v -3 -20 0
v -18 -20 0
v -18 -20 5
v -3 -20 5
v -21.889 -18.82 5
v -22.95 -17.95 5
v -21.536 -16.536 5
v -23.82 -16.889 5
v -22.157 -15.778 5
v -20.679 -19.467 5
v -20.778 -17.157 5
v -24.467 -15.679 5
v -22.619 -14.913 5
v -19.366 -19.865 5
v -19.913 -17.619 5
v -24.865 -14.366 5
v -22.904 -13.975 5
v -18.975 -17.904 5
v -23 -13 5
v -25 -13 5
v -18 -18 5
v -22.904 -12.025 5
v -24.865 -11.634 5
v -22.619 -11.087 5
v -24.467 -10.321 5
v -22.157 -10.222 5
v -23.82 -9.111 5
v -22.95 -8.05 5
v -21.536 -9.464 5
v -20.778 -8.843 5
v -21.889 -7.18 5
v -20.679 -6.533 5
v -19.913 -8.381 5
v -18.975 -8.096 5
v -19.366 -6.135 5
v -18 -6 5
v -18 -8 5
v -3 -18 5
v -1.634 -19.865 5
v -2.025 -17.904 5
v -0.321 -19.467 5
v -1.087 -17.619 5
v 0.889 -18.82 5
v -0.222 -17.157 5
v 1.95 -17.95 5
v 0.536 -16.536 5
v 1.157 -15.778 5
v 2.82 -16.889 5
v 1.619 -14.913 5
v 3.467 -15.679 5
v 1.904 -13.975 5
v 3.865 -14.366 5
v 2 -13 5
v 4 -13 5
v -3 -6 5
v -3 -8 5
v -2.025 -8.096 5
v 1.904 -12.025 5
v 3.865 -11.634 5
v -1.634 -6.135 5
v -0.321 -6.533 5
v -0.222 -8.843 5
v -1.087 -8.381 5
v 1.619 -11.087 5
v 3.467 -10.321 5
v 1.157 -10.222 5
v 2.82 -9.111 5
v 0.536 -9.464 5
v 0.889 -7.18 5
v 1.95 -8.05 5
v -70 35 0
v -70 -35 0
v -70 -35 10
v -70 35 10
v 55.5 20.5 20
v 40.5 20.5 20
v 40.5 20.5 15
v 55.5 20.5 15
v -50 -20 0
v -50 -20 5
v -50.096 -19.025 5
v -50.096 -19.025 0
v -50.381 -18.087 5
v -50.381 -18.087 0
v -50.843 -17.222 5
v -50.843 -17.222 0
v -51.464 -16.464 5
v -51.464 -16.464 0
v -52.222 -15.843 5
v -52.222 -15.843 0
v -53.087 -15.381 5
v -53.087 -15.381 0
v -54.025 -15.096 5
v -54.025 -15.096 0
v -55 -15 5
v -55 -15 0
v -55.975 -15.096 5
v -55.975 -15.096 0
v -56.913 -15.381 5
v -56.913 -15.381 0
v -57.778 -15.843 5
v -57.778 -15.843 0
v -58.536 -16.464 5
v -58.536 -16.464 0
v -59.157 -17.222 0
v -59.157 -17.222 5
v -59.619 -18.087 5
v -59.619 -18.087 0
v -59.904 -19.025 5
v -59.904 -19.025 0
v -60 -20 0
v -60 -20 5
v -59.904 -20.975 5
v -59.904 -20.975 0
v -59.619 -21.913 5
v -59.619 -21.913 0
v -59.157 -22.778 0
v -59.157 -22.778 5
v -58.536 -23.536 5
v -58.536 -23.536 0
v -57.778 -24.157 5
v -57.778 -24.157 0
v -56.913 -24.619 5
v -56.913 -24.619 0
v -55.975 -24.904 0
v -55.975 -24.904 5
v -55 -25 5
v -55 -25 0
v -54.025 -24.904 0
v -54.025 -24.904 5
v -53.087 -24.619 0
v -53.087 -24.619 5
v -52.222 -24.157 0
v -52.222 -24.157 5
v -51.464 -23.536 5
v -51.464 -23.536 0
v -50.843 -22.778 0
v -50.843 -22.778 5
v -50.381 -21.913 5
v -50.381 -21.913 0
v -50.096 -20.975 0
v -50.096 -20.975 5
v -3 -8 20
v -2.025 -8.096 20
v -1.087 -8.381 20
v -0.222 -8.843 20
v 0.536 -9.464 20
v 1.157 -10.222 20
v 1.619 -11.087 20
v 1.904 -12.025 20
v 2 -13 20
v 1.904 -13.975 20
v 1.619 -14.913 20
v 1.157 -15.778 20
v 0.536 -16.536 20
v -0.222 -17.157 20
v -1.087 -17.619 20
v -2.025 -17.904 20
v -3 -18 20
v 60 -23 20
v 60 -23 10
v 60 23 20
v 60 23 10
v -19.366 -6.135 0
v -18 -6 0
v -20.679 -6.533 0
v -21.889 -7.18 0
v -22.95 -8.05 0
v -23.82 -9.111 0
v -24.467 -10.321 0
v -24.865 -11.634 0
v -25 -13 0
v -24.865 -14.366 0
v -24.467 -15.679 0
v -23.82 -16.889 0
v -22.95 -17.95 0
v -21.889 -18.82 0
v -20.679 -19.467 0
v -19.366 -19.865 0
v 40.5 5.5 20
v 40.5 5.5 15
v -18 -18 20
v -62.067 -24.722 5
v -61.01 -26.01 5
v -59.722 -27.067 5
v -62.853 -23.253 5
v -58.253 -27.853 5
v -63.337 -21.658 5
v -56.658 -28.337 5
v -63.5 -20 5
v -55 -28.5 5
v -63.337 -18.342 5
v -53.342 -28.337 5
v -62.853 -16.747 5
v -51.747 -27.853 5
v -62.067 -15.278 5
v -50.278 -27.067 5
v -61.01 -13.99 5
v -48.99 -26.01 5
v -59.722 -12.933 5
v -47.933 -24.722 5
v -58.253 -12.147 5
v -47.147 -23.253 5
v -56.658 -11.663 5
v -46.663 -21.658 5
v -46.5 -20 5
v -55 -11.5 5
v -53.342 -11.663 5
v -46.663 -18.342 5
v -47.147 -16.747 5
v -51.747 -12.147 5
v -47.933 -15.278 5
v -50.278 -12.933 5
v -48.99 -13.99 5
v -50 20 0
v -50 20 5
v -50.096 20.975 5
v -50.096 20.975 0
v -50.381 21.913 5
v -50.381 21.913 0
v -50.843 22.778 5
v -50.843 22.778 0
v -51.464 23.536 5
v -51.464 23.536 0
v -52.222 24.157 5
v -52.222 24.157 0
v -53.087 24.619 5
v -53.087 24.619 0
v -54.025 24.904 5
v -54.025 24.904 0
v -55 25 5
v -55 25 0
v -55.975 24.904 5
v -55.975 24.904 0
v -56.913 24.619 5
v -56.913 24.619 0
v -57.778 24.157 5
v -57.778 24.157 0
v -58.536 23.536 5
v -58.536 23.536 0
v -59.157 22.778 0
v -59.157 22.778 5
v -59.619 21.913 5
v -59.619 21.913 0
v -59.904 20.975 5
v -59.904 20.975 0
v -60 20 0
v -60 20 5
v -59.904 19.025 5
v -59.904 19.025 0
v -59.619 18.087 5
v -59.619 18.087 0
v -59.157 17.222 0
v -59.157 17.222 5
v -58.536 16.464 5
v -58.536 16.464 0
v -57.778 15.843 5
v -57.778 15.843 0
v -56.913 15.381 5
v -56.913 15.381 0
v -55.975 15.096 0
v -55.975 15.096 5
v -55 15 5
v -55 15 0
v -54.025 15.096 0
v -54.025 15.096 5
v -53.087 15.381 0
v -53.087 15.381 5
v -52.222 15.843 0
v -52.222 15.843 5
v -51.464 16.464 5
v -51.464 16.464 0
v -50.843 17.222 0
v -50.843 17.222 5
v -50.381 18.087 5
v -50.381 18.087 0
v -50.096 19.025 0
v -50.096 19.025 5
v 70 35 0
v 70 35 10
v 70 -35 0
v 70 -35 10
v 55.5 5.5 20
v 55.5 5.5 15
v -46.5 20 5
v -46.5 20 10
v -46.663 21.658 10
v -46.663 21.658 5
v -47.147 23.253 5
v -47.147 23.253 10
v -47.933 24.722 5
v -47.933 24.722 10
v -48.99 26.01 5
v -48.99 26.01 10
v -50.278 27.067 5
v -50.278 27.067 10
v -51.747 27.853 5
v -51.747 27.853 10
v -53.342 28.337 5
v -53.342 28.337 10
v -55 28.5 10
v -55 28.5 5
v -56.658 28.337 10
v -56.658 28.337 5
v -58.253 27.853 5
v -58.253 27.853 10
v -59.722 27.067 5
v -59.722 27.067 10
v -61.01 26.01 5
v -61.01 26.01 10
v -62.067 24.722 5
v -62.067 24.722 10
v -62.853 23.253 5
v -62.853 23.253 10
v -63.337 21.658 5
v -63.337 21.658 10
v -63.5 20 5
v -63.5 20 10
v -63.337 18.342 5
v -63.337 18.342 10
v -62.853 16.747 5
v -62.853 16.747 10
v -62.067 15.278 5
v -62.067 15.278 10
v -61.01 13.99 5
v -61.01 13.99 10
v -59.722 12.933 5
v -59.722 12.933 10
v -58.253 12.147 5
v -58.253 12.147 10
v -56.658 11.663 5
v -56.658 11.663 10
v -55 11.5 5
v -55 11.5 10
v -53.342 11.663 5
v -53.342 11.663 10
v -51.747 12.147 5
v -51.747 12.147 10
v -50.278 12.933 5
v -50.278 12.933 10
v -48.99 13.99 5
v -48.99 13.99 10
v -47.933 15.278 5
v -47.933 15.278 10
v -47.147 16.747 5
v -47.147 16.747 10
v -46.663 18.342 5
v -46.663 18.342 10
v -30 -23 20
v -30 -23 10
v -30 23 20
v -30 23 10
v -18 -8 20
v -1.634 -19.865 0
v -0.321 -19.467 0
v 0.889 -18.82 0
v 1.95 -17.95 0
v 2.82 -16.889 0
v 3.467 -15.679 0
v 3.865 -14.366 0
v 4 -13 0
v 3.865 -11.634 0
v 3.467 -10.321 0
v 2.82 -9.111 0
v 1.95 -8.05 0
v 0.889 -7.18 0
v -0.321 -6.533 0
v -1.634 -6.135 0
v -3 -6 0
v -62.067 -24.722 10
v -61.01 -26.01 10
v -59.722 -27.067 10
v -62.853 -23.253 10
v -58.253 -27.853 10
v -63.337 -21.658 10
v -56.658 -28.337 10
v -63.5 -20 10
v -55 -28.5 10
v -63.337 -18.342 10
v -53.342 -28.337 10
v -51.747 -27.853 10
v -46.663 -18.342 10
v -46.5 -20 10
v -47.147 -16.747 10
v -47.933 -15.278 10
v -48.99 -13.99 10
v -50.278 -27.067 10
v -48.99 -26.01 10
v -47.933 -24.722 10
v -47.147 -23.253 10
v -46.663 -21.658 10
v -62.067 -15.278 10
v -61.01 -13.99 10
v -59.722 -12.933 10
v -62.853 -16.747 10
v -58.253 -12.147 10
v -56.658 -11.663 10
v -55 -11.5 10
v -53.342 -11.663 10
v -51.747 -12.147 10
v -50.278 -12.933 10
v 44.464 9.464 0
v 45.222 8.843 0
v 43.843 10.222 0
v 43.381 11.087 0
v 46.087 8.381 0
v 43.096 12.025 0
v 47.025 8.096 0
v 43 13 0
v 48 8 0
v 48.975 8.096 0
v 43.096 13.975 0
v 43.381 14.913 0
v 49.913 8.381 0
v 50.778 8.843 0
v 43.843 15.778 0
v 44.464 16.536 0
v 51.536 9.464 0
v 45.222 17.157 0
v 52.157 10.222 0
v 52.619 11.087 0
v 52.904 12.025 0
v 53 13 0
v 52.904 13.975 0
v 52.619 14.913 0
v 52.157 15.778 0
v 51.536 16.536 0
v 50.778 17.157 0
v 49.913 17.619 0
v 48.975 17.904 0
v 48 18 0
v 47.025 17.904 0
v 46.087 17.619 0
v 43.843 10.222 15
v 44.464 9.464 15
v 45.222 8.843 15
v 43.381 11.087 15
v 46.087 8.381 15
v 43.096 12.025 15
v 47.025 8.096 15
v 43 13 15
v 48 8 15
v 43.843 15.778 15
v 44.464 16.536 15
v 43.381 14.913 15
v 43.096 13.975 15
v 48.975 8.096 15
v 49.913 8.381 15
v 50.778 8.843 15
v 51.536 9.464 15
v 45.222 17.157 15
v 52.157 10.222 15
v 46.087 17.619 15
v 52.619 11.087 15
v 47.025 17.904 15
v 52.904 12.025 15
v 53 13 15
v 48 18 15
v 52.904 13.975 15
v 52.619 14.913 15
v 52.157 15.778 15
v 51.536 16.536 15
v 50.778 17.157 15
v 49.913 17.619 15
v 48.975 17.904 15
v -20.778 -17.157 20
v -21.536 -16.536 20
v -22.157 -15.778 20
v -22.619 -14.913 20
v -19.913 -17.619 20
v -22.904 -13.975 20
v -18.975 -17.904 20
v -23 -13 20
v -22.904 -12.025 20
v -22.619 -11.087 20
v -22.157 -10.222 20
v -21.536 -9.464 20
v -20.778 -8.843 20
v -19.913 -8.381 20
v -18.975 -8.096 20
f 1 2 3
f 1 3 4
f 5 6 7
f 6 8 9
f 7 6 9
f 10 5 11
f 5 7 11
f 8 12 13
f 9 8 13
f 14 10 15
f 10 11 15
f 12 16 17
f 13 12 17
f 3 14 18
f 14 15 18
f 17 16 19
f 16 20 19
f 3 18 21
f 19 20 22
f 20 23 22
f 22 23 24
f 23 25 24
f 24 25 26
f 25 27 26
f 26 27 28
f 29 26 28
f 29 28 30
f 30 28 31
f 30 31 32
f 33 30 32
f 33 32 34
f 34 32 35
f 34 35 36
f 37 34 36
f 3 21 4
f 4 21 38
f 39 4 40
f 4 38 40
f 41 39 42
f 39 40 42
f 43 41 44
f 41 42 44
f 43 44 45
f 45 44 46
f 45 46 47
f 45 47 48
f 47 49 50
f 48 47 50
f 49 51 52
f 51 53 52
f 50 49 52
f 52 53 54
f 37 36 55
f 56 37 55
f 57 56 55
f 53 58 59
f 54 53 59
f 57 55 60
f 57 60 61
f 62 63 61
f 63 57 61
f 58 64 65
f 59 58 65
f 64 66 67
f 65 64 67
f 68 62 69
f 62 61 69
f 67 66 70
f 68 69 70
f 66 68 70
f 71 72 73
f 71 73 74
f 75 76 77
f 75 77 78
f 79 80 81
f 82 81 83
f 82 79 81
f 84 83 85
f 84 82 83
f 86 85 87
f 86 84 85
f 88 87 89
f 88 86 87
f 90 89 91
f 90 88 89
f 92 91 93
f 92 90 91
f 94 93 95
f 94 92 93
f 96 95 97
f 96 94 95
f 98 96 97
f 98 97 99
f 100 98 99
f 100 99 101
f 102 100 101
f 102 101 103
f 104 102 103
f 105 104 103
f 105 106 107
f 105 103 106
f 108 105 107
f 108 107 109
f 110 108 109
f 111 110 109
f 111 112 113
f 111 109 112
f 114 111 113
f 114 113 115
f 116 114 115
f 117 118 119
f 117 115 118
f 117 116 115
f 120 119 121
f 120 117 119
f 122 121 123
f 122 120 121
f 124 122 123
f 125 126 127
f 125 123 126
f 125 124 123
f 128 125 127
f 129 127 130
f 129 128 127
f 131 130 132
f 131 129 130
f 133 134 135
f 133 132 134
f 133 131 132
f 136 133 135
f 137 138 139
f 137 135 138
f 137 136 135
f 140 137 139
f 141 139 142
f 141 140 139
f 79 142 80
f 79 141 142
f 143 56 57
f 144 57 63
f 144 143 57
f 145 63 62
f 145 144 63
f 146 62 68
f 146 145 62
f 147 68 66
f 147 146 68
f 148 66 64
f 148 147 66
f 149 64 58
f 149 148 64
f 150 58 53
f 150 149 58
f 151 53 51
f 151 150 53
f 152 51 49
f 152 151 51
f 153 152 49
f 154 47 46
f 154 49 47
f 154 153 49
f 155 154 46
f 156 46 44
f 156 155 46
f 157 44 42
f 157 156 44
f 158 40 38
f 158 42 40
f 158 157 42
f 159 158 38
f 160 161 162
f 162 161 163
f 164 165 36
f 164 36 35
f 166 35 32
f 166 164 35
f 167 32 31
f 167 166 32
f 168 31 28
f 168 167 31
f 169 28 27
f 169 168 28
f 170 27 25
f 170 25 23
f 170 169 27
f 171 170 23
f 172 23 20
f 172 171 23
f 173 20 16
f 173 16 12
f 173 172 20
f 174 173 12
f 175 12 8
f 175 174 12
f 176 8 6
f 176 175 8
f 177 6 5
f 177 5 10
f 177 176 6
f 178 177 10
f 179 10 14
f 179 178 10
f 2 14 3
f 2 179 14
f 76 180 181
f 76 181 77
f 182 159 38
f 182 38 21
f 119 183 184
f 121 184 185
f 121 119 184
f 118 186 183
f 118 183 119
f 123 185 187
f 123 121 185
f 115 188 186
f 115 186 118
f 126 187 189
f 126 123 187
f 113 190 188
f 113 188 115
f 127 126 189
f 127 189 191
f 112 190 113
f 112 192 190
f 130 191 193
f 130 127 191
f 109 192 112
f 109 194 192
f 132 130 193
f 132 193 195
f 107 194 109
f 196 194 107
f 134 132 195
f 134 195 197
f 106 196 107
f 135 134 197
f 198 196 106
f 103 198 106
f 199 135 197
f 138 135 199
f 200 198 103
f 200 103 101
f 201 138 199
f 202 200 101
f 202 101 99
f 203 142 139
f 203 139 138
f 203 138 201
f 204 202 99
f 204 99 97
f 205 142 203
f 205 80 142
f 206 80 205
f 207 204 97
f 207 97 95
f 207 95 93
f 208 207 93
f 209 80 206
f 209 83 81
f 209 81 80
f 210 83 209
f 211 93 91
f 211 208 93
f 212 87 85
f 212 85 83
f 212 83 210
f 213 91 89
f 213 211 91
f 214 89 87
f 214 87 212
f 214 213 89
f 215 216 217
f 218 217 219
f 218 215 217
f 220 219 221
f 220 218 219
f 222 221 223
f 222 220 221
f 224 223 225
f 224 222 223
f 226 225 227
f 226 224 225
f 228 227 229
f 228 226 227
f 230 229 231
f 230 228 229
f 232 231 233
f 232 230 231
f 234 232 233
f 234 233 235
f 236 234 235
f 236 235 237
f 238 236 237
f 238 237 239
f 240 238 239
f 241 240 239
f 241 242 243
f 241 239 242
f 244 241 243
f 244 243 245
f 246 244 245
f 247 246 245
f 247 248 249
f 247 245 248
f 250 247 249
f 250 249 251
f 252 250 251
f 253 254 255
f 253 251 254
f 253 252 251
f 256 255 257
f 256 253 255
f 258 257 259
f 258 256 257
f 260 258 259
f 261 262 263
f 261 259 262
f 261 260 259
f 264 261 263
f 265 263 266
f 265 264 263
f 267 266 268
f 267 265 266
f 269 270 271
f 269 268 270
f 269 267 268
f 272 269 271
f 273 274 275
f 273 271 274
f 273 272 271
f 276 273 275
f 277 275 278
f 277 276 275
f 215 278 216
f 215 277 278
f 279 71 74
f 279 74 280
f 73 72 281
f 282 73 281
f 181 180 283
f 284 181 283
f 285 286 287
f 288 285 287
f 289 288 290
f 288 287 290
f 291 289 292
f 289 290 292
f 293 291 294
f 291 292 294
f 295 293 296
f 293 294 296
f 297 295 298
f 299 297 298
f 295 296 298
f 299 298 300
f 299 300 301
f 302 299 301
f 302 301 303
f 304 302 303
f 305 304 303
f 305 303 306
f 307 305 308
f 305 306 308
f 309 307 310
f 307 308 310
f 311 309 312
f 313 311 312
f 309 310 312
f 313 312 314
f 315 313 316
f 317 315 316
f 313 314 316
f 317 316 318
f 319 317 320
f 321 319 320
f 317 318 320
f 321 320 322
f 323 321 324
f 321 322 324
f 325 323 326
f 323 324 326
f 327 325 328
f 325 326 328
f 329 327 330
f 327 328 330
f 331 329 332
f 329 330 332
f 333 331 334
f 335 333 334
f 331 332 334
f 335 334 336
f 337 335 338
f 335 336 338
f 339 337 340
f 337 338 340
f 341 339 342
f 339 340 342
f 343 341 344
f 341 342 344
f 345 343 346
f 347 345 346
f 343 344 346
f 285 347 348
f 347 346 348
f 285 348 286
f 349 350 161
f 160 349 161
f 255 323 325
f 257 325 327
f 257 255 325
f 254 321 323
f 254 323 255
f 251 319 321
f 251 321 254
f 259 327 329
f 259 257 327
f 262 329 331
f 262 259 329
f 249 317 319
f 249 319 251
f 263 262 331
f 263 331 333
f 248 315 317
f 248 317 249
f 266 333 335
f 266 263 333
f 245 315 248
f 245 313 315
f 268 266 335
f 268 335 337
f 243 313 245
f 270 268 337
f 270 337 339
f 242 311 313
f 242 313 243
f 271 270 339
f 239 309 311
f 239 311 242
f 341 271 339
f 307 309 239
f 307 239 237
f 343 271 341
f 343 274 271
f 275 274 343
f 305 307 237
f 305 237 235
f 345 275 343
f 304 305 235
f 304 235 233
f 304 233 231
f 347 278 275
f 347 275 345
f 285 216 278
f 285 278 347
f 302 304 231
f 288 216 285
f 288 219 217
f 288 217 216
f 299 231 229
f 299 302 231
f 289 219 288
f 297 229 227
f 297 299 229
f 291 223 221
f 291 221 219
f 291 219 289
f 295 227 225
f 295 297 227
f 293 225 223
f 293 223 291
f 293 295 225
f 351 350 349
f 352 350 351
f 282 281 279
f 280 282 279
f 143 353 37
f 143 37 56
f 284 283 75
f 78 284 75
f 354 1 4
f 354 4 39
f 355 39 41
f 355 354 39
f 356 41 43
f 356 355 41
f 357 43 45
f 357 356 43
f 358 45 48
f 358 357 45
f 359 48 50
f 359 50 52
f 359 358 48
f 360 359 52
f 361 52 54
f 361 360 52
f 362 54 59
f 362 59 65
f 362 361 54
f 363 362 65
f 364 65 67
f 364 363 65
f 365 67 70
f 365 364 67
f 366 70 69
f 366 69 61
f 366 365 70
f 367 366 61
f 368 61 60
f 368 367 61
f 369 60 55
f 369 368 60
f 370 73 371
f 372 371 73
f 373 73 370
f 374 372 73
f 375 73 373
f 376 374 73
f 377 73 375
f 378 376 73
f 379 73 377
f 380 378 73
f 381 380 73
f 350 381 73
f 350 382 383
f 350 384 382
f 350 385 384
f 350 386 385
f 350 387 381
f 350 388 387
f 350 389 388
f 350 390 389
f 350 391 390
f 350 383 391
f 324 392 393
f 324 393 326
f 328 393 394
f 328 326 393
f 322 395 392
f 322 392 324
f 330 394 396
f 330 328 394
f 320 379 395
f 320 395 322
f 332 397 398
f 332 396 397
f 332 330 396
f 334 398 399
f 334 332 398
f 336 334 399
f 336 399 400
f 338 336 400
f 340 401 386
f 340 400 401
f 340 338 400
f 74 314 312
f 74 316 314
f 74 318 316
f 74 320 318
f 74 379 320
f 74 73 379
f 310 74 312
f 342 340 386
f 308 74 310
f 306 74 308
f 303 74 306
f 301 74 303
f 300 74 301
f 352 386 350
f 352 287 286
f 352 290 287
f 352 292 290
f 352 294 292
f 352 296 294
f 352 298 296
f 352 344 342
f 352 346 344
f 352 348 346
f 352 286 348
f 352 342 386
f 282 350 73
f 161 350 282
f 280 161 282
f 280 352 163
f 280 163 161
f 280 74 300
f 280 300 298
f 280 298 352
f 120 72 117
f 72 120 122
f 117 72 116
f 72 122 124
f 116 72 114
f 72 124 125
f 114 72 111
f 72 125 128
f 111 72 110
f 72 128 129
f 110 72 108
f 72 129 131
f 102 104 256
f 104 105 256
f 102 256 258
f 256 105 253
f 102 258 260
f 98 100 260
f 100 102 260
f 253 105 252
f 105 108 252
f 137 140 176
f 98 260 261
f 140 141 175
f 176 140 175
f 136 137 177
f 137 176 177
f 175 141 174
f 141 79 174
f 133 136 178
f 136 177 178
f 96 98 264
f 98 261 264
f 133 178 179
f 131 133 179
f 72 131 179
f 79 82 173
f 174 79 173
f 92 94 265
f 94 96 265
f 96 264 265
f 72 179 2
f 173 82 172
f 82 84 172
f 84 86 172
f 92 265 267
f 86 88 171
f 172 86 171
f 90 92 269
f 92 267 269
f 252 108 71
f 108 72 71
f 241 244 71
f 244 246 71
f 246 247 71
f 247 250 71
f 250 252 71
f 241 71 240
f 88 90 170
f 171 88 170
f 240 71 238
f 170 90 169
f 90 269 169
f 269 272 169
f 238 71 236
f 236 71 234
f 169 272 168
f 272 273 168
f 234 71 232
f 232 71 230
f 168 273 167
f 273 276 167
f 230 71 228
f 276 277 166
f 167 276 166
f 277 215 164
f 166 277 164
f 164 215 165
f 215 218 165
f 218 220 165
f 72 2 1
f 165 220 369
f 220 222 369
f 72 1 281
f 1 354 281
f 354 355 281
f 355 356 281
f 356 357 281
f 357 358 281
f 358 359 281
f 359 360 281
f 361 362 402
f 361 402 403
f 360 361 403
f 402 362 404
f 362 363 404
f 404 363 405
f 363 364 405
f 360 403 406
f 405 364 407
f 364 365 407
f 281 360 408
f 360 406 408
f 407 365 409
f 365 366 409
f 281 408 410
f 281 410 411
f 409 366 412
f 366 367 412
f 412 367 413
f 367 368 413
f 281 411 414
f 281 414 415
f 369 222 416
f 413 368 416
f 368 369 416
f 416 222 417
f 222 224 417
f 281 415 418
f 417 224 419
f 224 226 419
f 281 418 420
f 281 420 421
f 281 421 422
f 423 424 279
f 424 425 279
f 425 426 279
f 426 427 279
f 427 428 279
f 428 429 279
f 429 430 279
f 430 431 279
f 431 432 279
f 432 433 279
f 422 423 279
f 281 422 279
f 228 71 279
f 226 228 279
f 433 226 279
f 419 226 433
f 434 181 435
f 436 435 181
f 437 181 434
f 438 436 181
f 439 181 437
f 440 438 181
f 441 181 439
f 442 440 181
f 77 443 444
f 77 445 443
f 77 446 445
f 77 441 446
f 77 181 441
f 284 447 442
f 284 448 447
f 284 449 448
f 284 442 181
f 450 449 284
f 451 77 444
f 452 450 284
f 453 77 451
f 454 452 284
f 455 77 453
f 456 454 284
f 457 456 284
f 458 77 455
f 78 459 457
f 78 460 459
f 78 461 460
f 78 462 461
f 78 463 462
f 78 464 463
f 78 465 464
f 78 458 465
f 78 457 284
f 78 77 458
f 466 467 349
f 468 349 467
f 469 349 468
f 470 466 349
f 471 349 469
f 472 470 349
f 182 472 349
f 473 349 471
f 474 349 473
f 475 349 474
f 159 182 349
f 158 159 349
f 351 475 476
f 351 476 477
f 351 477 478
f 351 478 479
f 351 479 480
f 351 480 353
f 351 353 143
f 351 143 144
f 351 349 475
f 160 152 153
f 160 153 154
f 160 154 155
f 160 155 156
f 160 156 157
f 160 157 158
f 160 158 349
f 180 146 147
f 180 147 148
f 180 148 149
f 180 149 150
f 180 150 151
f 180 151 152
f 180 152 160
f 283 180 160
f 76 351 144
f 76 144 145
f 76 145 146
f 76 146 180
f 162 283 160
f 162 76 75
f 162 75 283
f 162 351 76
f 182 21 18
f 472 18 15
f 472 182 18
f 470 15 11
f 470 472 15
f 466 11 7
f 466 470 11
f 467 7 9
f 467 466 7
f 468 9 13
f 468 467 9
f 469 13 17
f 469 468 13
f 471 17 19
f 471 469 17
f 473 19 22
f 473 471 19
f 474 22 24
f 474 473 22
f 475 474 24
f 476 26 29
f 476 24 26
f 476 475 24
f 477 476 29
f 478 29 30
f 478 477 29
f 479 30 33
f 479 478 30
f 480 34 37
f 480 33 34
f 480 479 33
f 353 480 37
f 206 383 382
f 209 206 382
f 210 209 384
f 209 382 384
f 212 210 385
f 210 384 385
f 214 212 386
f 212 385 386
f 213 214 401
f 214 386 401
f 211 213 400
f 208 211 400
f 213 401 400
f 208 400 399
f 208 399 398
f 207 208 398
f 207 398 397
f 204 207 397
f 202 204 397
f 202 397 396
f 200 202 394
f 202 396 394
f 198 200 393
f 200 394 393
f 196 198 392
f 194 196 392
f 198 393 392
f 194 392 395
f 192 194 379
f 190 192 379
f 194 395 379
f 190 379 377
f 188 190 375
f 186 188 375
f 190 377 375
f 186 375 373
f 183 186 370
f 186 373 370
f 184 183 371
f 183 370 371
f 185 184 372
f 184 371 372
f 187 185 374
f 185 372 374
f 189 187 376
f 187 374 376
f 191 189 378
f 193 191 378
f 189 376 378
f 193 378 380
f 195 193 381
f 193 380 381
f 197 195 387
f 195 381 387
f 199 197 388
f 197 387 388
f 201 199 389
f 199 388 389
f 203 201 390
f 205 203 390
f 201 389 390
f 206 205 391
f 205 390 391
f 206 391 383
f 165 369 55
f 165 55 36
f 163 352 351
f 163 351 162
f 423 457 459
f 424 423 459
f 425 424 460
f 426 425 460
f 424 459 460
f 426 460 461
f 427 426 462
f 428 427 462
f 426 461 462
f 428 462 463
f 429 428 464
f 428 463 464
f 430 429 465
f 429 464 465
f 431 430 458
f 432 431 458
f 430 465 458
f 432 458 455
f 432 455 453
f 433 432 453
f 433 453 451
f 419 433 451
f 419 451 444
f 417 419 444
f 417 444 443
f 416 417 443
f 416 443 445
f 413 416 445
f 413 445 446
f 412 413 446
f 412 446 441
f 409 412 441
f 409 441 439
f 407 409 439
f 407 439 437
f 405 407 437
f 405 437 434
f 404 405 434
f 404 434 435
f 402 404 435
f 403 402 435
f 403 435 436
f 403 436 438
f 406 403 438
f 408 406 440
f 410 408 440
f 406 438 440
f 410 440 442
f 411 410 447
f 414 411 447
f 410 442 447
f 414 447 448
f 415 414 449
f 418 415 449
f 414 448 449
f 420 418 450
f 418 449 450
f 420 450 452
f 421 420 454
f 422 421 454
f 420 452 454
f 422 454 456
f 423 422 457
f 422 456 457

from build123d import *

# Parameters (mm, degrees)
ESQUISSE1_W             = 140
ESQUISSE1_H             = 70
ESQUISSE1_R             = 5
BOSS_EXTRU_1_DEPTH      = 10
ESQUISSE2_R             = 8.5
ENL_V_MAT_EXTRU_1_DEPTH = 5
ESQUISSE3_W             = 90
ESQUISSE3_H             = 46
BOSS_EXTRU_2_DEPTH      = 10
ESQUISSE4_R             = 5
ENL_V_MAT_EXTRU_2_DEPTH = 81.777472107
ESQUISSE5_W             = 15
ESQUISSE5_H             = 15
ENL_V_MAT_EXTRU_3_DEPTH = 5
ENL_V_MAT_EXTRU_4_DEPTH = 5


with BuildPart() as part:
    # Esquisse1 → Boss.-Extru.1 (new body)
    with BuildSketch(Plane.XY):
        Rectangle(ESQUISSE1_W, ESQUISSE1_H)
        with Locations((-55, 20)):
            Circle(ESQUISSE1_R, mode=Mode.SUBTRACT)
        with Locations((-55, -20)):
            Circle(ESQUISSE1_R, mode=Mode.SUBTRACT)
    extrude(amount=BOSS_EXTRU_1_DEPTH)

    # Esquisse2 → Enlèv. mat.-Extru.1 (cut)
    with BuildSketch(Plane.XY.offset(10)):
        with Locations((-55, 20)):
            Circle(ESQUISSE2_R)
        with Locations((-55, -20)):
            Circle(ESQUISSE2_R)
    extrude(amount=-ENL_V_MAT_EXTRU_1_DEPTH, mode=Mode.SUBTRACT)

    # Esquisse3 → Boss.-Extru.2 (add)
    with BuildSketch(Plane.XY.offset(10)):
        with Locations((15, 0)):
            Rectangle(ESQUISSE3_W, ESQUISSE3_H)
    extrude(amount=BOSS_EXTRU_2_DEPTH)

    # Esquisse4 → Enlèv. mat.-Extru.2 (cut, through all)
    with BuildSketch(Plane.XY.offset(20)):
        with Locations((48, 13)):
            Circle(ESQUISSE4_R)
        with BuildLine():
            Line((-18, -8), (-3, -8))
            ThreePointArc((-3, -8), (2, -13), (-3, -18))
            Line((-3, -18), (-18, -18))
            ThreePointArc((-18, -18), (-23, -13), (-18, -8))
        make_face()
    extrude(amount=-ENL_V_MAT_EXTRU_2_DEPTH, mode=Mode.SUBTRACT)

    # Esquisse5 → Enlèv. mat.-Extru.3 (cut)
    with BuildSketch(Plane.XY.offset(20)):
        with Locations((48, 13)):
            Rectangle(ESQUISSE5_W, ESQUISSE5_H)
    extrude(amount=-ENL_V_MAT_EXTRU_3_DEPTH, mode=Mode.SUBTRACT)

    # Esquisse6 → Enlèv. mat.-Extru.4 (cut)
    with BuildSketch(Plane(origin=(0, 0, 0), x_dir=(-1, 0, 0), z_dir=(0, 0, -1))):
        with BuildLine():
            Line((18, -20), (3, -20))
            ThreePointArc((3, -20), (-4, -13), (3, -6))
            Line((3, -6), (18, -6))
            ThreePointArc((18, -6), (25, -13), (18, -20))
        make_face()
    extrude(amount=-ENL_V_MAT_EXTRU_4_DEPTH, mode=Mode.SUBTRACT)


solid = part.part
